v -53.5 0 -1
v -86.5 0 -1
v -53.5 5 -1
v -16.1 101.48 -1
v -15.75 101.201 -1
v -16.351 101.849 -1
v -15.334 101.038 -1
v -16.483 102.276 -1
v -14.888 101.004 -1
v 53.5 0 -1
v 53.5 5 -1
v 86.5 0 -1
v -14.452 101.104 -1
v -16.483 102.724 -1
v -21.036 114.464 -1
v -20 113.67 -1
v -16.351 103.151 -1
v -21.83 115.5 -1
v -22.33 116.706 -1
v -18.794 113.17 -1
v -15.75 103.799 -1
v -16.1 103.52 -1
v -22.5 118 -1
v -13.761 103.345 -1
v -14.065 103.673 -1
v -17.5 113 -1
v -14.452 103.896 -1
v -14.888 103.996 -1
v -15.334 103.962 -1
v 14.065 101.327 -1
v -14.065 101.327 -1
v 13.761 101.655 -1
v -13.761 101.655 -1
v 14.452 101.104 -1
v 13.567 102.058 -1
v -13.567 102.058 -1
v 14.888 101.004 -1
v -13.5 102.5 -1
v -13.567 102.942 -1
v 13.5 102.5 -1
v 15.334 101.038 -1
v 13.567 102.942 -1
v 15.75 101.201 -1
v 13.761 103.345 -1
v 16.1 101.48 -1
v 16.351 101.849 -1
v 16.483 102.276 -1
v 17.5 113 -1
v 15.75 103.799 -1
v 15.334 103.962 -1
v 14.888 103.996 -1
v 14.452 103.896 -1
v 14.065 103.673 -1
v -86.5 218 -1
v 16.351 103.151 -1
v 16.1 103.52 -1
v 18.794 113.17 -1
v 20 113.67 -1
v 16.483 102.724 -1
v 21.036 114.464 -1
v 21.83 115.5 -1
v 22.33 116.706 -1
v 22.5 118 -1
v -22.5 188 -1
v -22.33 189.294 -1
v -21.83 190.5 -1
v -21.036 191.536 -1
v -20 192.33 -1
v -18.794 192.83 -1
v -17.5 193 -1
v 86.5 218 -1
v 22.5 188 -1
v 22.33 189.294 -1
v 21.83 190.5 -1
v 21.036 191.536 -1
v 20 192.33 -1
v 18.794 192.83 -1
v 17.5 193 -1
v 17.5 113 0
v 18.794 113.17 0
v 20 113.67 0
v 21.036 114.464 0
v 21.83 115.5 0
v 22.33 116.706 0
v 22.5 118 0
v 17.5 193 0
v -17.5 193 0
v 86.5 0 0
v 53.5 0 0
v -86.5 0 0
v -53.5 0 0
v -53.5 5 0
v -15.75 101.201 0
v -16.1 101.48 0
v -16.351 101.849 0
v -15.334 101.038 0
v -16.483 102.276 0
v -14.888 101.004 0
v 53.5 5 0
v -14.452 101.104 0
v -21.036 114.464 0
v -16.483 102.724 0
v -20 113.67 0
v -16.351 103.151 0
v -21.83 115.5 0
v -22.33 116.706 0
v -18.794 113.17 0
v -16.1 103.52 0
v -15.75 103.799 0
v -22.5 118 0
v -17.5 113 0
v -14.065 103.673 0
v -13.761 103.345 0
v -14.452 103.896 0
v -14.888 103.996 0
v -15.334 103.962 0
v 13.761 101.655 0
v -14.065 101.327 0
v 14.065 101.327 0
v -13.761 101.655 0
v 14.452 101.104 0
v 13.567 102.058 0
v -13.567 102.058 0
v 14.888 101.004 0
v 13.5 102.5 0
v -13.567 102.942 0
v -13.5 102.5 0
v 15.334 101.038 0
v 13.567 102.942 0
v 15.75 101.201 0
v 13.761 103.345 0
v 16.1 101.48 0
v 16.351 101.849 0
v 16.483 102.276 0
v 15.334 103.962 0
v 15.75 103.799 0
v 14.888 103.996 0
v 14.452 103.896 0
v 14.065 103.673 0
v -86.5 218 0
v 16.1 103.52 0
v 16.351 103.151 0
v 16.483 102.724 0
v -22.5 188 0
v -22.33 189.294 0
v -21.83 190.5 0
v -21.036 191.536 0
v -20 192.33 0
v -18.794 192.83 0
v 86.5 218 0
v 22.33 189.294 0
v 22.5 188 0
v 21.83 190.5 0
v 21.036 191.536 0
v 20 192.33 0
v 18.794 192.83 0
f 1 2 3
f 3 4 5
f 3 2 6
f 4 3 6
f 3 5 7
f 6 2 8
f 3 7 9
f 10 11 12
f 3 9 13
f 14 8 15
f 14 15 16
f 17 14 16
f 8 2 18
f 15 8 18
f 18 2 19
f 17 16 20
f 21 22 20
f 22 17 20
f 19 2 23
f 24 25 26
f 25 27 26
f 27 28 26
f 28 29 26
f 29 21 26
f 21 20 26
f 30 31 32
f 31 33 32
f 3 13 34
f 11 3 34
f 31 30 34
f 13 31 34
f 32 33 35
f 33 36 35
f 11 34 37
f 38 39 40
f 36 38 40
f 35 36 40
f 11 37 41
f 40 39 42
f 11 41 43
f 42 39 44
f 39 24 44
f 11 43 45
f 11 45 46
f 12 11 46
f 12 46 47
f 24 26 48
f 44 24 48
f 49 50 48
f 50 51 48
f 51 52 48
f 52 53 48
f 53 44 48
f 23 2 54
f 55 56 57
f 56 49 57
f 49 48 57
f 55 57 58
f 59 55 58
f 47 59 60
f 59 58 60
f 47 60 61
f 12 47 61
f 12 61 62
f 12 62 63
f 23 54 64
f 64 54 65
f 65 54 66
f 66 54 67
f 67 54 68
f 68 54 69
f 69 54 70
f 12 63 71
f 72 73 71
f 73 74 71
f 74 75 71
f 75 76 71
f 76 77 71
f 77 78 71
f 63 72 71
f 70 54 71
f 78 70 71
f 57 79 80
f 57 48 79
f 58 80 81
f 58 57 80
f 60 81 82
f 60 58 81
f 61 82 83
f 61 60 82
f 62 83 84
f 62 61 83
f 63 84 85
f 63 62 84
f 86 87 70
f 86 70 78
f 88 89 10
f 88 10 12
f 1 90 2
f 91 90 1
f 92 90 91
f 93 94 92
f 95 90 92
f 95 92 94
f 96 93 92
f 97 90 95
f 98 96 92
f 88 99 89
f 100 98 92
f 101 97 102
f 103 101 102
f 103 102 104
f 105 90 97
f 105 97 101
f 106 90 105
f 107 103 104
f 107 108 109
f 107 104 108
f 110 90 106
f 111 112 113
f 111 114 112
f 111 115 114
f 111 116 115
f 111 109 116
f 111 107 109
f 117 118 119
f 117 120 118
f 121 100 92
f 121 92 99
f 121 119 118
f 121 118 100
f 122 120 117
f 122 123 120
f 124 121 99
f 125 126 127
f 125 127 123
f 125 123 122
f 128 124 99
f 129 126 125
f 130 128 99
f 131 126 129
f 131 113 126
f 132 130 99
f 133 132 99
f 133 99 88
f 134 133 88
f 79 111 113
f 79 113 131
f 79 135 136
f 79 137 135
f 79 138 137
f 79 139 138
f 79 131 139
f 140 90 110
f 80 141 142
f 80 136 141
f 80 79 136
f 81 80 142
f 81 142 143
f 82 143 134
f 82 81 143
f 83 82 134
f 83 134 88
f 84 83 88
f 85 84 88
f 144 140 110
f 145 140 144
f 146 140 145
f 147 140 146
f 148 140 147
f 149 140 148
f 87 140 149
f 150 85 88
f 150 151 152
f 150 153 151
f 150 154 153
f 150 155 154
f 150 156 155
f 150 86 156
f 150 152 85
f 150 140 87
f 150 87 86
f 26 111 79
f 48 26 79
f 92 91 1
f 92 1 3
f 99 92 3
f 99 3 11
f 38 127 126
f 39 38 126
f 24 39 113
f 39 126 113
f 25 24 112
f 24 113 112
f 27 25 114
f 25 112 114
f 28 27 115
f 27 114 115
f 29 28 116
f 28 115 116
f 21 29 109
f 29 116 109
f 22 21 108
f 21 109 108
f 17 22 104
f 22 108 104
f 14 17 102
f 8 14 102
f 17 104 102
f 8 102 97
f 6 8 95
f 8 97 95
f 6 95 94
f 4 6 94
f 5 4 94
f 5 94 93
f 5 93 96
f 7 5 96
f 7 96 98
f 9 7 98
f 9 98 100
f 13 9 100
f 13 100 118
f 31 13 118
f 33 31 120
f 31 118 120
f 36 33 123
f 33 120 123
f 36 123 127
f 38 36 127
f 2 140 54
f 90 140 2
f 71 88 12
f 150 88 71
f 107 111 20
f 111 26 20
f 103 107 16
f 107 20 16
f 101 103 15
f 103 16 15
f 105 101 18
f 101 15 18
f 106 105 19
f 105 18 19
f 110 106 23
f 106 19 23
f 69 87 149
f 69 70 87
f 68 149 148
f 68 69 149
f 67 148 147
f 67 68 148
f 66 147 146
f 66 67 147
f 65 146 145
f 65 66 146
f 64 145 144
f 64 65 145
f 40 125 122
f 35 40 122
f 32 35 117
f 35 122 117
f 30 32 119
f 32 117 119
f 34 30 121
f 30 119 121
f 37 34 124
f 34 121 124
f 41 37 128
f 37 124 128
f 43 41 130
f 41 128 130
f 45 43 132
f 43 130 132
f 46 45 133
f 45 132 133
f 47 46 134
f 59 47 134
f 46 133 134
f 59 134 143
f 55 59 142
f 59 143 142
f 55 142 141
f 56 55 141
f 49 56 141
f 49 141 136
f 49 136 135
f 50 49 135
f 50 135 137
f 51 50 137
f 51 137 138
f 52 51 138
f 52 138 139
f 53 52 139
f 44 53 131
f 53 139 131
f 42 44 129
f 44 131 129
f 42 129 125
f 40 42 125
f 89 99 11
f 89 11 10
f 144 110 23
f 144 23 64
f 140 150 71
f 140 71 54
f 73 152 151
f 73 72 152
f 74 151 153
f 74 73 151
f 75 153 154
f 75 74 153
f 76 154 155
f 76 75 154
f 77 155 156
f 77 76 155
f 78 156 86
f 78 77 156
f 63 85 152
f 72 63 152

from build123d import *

# Parameters (mm, degrees)
T_LE_DE_BASE_PLI_E1_DEPTH = 1
ESQUISSE2_R               = 1.5
ESQUISSE2_W               = 45
ESQUISSE2_H               = 80
ENL_V_MAT_EXTRU_1_DEPTH   = 1
CONG_1_R                  = 5


# Sheet-metal steps are written as plain solids
with BuildPart() as part:
    # Esquisse1 → Tôle de base pliée1 (new body)
    with BuildSketch(Plane.XY):
        Polygon((53.5, 0), (86.5, 0), (86.5, 218), (-86.5, 218), (-86.5, 0), (-53.5, 0), (-53.5, 5), (53.5, 5), align=None)
    extrude(amount=-T_LE_DE_BASE_PLI_E1_DEPTH)

    # Esquisse2 → Enlèv. mat.-Extru.1 (cut)
    with BuildSketch(Plane.XY):
        with Locations((-15, 102.5)):
            Circle(ESQUISSE2_R)
        with Locations(Location((15, 102.5, 0), (0, 0, 180))):
            Circle(ESQUISSE2_R)
        with Locations((0, 153)):
            Rectangle(ESQUISSE2_W, ESQUISSE2_H)
    extrude(amount=-ENL_V_MAT_EXTRU_1_DEPTH, mode=Mode.SUBTRACT)

    # Congé1
    cong_1_edges = [part.edges().sort_by_distance(p)[0] for p in [
        (-22.5, 113, -0.5),
        (-22.5, 193, -0.5),
        (22.5, 193, -0.5),
        (22.5, 113, -0.5),
    ]]
    fillet(cong_1_edges, radius=CONG_1_R)


solid = part.part
